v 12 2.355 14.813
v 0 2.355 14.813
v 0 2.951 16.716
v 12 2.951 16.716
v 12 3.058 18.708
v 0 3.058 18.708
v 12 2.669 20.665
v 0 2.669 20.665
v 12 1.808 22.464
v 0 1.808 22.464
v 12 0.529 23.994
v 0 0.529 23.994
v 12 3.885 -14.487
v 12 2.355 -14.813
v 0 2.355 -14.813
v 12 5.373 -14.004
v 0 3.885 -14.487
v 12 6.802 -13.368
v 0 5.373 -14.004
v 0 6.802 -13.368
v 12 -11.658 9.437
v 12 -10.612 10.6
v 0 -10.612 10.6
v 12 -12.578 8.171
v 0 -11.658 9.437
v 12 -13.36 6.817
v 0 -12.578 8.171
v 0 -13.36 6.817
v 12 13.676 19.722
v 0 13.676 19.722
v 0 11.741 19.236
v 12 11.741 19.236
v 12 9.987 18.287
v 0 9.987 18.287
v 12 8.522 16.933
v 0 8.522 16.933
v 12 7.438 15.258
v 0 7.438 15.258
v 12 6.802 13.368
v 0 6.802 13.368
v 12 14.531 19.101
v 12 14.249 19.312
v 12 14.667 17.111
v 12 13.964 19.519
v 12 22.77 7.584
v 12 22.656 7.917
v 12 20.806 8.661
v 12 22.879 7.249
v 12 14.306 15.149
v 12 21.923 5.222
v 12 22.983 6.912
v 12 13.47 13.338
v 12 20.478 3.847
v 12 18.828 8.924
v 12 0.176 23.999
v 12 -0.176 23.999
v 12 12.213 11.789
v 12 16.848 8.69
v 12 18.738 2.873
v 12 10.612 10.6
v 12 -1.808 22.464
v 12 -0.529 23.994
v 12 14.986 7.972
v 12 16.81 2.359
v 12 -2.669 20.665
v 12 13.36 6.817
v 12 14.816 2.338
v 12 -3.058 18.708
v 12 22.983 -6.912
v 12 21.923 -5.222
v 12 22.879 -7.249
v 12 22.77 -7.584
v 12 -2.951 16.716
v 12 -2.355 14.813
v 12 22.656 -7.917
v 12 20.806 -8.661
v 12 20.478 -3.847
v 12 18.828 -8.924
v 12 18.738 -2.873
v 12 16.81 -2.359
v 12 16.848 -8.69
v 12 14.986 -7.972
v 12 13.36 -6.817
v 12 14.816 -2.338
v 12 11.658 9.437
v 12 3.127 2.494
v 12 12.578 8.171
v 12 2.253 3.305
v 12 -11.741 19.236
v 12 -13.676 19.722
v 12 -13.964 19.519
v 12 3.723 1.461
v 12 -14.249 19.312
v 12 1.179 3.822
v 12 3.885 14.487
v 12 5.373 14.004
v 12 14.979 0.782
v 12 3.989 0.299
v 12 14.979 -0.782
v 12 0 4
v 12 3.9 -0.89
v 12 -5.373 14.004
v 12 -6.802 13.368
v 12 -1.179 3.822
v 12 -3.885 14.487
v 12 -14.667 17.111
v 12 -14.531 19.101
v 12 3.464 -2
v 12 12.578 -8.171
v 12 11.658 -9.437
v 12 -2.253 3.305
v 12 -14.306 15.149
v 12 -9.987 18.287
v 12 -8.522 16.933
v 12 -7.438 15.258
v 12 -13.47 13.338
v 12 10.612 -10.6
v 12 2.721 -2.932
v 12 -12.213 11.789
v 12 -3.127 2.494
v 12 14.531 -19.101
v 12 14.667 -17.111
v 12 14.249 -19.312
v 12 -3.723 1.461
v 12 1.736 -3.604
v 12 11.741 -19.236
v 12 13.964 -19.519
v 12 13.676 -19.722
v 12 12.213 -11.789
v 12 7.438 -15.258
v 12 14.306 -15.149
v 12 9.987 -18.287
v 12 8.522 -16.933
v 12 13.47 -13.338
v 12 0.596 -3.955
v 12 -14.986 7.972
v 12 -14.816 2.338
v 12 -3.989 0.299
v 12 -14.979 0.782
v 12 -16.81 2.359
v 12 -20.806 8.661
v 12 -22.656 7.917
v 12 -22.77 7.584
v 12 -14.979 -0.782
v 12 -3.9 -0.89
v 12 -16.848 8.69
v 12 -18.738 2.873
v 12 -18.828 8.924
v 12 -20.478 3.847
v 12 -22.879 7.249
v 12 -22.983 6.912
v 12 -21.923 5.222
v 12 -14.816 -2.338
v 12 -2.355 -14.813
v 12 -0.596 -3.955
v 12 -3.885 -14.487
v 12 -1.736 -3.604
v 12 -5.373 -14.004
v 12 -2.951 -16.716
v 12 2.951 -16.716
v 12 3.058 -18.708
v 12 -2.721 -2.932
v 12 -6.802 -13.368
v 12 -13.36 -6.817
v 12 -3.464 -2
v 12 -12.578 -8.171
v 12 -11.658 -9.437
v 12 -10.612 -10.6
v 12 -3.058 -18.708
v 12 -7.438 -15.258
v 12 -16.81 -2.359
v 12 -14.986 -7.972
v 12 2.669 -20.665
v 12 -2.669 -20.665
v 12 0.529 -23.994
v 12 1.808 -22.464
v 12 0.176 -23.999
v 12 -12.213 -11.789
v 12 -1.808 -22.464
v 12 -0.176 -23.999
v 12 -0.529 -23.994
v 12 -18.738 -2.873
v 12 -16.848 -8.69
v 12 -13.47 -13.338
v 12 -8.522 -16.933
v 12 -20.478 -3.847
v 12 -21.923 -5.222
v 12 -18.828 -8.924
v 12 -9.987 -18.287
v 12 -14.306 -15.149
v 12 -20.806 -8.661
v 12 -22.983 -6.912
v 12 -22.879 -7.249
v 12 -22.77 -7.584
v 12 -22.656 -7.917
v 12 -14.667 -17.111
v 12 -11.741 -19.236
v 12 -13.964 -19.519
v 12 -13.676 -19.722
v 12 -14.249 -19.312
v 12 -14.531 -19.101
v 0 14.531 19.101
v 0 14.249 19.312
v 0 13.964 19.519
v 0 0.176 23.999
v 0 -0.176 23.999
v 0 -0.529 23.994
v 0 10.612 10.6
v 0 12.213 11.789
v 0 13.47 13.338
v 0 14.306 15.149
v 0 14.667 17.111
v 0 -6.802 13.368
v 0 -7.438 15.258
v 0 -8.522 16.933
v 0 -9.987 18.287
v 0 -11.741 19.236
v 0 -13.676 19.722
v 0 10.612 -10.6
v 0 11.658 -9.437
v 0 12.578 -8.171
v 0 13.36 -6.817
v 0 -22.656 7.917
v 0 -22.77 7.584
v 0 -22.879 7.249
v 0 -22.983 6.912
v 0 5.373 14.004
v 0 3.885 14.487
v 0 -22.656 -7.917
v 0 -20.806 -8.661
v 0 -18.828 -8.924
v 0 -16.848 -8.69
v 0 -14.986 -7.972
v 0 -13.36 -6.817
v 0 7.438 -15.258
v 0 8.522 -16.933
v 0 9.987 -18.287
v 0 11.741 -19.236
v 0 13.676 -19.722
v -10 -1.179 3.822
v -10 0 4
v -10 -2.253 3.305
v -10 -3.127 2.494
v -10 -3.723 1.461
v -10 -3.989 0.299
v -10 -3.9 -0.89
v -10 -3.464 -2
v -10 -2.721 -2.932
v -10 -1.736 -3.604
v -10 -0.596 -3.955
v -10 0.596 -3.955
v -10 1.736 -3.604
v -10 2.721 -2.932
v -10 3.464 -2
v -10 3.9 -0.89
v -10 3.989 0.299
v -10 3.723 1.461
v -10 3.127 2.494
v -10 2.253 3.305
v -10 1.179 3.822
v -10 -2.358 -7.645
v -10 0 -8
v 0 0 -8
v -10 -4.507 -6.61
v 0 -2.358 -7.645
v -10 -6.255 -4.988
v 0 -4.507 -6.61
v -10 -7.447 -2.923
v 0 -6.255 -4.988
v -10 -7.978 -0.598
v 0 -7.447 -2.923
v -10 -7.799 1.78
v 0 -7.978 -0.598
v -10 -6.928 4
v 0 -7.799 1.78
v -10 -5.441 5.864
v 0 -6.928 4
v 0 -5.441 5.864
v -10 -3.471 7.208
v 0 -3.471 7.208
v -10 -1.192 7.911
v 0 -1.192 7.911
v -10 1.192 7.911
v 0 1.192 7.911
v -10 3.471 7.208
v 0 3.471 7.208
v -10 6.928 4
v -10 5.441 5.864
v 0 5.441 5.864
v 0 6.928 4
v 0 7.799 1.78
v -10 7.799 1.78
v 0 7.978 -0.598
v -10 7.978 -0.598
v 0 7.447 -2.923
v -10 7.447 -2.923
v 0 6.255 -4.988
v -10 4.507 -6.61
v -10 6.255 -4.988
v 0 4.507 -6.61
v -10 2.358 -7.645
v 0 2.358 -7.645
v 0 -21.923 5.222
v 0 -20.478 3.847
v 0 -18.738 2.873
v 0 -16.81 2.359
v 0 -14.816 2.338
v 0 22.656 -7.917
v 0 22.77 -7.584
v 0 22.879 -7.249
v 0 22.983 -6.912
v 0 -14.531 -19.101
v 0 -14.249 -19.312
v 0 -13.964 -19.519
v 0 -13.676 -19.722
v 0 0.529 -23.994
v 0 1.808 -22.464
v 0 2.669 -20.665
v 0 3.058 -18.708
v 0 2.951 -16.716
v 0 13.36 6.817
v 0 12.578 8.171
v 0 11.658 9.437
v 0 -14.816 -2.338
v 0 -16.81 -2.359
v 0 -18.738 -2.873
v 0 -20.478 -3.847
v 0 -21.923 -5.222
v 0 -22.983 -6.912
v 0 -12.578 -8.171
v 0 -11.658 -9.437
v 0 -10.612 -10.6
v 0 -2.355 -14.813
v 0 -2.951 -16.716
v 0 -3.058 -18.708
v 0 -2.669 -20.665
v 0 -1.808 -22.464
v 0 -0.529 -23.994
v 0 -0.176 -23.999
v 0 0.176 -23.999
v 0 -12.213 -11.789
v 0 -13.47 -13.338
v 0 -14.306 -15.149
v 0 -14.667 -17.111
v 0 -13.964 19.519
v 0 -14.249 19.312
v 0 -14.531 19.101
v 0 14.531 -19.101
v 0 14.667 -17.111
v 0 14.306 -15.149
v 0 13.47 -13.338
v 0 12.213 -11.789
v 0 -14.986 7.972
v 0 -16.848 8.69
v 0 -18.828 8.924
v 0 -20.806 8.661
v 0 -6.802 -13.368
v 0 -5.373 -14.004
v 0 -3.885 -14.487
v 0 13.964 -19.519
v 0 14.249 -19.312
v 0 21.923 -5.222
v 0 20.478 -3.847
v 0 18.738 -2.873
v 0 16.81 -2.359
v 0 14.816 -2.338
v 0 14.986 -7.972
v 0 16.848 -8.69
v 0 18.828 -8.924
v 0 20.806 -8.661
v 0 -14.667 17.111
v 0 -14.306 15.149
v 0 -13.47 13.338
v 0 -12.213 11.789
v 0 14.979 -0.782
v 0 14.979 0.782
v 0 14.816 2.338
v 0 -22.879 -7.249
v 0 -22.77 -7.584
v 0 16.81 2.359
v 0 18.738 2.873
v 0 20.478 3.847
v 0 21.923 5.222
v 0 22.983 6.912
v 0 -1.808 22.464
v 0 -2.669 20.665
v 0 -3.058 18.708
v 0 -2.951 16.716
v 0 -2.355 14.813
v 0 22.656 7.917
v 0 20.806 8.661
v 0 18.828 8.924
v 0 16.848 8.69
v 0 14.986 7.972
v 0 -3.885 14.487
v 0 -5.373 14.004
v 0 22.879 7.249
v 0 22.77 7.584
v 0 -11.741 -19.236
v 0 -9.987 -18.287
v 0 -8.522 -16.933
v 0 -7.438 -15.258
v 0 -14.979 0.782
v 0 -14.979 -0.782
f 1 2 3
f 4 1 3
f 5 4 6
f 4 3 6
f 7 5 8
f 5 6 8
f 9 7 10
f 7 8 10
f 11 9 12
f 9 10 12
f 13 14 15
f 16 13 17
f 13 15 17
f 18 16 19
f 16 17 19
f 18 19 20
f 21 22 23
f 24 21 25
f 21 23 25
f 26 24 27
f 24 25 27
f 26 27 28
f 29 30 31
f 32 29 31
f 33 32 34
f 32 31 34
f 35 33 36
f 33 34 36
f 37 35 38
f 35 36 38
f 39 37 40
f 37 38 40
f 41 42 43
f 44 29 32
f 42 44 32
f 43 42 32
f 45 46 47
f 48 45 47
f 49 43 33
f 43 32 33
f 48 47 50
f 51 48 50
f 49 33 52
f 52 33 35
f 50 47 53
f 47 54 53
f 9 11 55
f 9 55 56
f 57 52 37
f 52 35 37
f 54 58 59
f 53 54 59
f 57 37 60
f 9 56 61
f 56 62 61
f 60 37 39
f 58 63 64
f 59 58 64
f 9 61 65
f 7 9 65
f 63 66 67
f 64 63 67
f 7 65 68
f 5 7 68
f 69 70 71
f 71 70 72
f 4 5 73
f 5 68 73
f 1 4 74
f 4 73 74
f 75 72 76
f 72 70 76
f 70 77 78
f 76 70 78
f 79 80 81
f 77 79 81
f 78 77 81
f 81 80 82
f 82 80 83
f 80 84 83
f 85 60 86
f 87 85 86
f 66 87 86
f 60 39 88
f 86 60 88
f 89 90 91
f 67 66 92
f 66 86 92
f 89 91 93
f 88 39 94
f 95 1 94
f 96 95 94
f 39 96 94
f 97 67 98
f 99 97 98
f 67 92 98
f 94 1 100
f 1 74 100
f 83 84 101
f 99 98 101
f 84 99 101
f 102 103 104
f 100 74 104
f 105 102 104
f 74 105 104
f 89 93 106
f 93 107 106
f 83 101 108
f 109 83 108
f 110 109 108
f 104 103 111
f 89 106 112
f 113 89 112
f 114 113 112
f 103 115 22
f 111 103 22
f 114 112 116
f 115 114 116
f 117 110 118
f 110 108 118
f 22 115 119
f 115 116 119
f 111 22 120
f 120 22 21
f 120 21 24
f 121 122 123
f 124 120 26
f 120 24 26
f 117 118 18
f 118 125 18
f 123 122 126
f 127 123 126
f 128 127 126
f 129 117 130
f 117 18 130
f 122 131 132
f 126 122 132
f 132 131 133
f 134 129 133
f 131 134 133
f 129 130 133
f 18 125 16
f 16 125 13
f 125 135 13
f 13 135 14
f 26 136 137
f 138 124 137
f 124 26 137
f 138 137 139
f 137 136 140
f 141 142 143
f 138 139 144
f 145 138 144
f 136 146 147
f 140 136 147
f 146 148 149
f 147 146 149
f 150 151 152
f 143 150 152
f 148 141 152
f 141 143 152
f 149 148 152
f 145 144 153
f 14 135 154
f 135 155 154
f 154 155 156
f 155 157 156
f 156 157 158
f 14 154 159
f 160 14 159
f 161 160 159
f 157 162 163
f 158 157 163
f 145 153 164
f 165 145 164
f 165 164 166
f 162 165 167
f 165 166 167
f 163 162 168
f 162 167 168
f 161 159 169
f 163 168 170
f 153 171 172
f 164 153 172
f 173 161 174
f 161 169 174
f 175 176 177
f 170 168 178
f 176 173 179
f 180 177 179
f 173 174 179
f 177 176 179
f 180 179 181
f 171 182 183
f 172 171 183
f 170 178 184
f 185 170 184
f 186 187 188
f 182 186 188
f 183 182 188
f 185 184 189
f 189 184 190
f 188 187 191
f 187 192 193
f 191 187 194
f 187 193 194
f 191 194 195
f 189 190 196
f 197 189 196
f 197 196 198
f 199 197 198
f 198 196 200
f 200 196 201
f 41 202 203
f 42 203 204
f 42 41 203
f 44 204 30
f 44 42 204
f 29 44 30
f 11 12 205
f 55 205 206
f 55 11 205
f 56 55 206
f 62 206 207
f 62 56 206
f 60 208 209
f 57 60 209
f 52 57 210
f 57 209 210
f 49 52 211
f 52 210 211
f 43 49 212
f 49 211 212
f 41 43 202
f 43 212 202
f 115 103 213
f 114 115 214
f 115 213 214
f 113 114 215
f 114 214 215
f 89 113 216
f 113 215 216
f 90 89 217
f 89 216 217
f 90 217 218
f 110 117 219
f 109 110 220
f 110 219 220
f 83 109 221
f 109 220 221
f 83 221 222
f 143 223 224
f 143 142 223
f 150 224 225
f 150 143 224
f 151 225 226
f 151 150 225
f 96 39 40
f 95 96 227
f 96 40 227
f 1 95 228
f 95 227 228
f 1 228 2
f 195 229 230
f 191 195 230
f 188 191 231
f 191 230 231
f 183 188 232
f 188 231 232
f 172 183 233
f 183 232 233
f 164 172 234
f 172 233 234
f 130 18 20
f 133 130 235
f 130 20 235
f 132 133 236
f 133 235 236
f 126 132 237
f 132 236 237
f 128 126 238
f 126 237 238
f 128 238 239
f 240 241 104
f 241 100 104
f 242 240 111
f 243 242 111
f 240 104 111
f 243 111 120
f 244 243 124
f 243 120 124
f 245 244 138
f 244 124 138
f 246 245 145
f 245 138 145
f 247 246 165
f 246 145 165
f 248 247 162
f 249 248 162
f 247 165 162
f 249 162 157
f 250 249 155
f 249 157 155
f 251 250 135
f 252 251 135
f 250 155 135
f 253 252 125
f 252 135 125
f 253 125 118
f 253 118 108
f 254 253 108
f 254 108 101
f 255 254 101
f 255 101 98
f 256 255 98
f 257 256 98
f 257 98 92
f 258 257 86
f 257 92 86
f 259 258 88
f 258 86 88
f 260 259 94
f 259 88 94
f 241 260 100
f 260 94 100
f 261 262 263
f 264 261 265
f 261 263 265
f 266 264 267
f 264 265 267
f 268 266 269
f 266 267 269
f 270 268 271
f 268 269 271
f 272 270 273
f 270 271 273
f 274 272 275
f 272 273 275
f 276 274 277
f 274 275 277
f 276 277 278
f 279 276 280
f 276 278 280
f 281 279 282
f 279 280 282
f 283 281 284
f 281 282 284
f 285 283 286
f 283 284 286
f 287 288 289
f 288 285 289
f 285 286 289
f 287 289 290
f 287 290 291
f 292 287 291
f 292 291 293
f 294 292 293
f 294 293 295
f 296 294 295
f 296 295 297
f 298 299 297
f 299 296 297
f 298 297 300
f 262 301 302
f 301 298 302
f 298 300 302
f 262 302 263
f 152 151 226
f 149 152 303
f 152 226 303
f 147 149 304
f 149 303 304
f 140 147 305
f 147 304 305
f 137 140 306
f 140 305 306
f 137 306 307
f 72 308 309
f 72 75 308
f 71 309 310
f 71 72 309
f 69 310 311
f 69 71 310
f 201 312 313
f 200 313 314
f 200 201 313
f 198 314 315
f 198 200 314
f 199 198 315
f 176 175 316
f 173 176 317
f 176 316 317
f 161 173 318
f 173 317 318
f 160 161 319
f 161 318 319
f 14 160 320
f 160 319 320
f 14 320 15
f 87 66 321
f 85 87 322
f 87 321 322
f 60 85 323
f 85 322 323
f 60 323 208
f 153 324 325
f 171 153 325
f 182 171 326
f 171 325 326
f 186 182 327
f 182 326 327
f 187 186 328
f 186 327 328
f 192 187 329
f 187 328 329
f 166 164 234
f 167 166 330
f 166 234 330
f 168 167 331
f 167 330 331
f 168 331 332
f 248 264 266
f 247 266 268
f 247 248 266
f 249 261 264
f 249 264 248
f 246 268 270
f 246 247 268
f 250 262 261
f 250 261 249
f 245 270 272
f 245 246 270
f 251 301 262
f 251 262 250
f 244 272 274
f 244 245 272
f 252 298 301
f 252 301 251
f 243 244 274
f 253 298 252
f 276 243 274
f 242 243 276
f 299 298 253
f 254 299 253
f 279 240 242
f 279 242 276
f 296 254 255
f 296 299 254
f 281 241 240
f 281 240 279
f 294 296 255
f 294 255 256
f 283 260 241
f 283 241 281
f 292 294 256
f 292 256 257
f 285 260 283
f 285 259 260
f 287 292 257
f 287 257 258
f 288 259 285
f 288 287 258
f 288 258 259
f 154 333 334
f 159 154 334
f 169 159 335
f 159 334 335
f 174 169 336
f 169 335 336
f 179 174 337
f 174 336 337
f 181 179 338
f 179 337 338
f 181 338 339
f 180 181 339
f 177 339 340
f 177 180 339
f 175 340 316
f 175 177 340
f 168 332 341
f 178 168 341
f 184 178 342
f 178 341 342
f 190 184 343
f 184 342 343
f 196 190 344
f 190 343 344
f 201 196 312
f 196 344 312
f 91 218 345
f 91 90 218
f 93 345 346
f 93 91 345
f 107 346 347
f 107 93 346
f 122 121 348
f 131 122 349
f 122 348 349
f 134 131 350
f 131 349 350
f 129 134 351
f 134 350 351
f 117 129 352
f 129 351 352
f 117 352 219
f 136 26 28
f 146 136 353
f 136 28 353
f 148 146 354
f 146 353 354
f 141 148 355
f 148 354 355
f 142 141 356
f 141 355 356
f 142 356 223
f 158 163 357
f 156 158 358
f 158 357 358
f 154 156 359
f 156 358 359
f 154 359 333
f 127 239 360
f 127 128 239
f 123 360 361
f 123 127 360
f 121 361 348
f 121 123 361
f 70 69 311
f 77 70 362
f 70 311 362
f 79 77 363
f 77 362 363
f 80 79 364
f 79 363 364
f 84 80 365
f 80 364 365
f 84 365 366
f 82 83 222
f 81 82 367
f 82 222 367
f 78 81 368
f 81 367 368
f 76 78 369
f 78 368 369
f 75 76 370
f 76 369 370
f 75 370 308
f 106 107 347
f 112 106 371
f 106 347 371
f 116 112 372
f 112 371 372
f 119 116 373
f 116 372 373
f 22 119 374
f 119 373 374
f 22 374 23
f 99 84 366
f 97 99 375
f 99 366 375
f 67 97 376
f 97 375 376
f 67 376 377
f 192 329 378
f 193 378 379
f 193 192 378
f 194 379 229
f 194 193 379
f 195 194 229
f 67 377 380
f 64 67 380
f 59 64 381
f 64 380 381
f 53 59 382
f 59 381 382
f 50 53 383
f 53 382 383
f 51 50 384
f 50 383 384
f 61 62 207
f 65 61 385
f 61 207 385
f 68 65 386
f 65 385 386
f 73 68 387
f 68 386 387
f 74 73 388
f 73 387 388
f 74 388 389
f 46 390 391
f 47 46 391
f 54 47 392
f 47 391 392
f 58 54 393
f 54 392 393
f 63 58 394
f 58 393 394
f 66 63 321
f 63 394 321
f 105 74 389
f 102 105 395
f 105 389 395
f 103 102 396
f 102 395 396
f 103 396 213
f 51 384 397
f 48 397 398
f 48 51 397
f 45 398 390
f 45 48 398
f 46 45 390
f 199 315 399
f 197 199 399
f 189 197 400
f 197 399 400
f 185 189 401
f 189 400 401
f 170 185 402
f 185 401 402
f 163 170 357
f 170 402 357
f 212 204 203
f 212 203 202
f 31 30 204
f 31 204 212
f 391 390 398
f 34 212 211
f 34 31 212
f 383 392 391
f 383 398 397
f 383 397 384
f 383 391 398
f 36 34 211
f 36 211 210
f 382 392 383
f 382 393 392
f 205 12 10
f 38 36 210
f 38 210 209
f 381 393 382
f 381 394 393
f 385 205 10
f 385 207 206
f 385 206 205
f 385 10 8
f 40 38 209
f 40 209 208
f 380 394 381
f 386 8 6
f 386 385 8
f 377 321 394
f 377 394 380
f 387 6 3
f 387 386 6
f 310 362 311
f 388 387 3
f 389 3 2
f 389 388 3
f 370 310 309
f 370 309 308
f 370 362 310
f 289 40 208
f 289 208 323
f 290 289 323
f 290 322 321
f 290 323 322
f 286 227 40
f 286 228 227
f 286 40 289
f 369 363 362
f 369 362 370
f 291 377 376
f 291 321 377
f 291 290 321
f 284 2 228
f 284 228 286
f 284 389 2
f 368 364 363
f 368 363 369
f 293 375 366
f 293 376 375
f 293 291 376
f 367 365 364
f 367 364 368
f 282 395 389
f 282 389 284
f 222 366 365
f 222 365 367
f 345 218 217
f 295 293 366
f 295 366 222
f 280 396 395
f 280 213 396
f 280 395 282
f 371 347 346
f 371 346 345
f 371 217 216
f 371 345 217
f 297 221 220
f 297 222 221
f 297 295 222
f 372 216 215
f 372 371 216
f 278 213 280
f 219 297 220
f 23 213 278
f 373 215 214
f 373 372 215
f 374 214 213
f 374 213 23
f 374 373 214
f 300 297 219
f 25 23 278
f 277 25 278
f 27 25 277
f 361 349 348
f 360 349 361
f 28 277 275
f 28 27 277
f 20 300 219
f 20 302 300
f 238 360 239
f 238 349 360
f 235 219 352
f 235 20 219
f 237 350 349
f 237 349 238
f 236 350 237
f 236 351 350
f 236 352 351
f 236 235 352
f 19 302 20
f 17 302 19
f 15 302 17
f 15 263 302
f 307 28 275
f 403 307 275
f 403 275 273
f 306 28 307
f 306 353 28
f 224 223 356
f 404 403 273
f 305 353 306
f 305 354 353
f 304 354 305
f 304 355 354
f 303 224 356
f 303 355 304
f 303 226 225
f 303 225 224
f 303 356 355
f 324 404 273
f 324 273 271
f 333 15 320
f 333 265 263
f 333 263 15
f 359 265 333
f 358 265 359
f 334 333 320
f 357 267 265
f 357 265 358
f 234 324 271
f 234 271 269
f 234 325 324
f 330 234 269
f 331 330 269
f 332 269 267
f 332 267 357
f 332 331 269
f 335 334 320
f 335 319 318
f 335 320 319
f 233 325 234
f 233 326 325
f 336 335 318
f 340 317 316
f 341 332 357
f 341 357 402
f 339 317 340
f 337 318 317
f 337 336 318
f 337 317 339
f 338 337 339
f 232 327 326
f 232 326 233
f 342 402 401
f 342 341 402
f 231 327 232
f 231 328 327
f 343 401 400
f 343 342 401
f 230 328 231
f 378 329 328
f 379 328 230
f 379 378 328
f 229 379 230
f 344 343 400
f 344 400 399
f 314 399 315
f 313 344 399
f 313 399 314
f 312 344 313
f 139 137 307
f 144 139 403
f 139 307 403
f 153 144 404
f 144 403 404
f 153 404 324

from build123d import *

# Parameters (mm, degrees)
BASPROSKE_W        = 12
BASPROSKE_H        = 24
TOOTHCUT_DEPTH     = 37
TEETHCUTS_COUNT    = 10
TEETHCUTS_ANGLE    = 324
HUBNEAONESKE_R     = 8
HUBNEARONE_DEPTH   = 38.0000508
BORSKE_R           = 4
BORE_DEPTH         = 12.0000508
SKETCH1_R          = 10.27069338
CUT_EXTRUDE1_DEPTH = 43


with BuildPart() as part:
    # BasProSke → Base-Revolve (revolve)
    with BuildSketch(Plane(origin=(0, 0, 0), x_dir=(1, 0, 0), z_dir=(0, 1, 0)), mode=Mode.PRIVATE) as base_revolve_sk:
        with Locations((6, 12)):
            Rectangle(BASPROSKE_W, BASPROSKE_H)
    revolve(base_revolve_sk.sketch.rotate(Axis((-10, 0, 0), (1, 0, 0)), 180), axis=Axis((-10, 0, 0), (1, 0, 0)))

    # TooCutSke → ToothCut (cut, through all)
    with BuildSketch(Plane(origin=(0, 0, 0), x_dir=(0, 0, -1), z_dir=(1, 0, 0))):
        with BuildLine():
            ThreePointArc((2.33803632, 14.815653451), (0, 14.999), (-2.33803632, 14.815653451))
            ThreePointArc((-2.33803632, 14.815653451), (-3.315013319, 19.654913653), (-6.946609122, 22.999227528))
            ThreePointArc((-6.946609122, 22.999227528), (0, 24.0254), (6.946609122, 22.999227528))
            ThreePointArc((6.946609122, 22.999227528), (3.315013319, 19.654913653), (2.33803632, 14.815653451))
        make_face()
    toothcut = extrude(amount=TOOTHCUT_DEPTH, mode=Mode.SUBTRACT)

    # TeethCuts: ToothCut ×10 about axis
    teethcuts_axis = Axis((-10, 0, 0), (1, 0, 0))
    for i in range(1, TEETHCUTS_COUNT):
        add(toothcut.rotate(teethcuts_axis, i * TEETHCUTS_ANGLE / (TEETHCUTS_COUNT - 1)), mode=Mode.SUBTRACT)

    # HubNeaOneSke → HubNearOne (add)
    with BuildSketch(Plane.ZY):
        with Locations(Location((0, 0, 0), (0, 0, 180))):
            Circle(HUBNEAONESKE_R)
    extrude(amount=HUBNEARONE_DEPTH)

    # BorSke → Bore (cut, symmetric)
    with BuildSketch(Plane(origin=(0, 0, 0), x_dir=(0, 0, -1), z_dir=(1, 0, 0))):
        with Locations(Location((0, 0, 0), (0, 0, 180))):
            Circle(BORSKE_R)
    extrude(amount=BORE_DEPTH, both=True, mode=Mode.SUBTRACT)

    # Sketch1 → Cut-Extrude1 (cut)
    with BuildSketch(Plane.ZY.offset(10)):
        Circle(SKETCH1_R)
    extrude(amount=CUT_EXTRUDE1_DEPTH, mode=Mode.SUBTRACT)


solid = part.part
